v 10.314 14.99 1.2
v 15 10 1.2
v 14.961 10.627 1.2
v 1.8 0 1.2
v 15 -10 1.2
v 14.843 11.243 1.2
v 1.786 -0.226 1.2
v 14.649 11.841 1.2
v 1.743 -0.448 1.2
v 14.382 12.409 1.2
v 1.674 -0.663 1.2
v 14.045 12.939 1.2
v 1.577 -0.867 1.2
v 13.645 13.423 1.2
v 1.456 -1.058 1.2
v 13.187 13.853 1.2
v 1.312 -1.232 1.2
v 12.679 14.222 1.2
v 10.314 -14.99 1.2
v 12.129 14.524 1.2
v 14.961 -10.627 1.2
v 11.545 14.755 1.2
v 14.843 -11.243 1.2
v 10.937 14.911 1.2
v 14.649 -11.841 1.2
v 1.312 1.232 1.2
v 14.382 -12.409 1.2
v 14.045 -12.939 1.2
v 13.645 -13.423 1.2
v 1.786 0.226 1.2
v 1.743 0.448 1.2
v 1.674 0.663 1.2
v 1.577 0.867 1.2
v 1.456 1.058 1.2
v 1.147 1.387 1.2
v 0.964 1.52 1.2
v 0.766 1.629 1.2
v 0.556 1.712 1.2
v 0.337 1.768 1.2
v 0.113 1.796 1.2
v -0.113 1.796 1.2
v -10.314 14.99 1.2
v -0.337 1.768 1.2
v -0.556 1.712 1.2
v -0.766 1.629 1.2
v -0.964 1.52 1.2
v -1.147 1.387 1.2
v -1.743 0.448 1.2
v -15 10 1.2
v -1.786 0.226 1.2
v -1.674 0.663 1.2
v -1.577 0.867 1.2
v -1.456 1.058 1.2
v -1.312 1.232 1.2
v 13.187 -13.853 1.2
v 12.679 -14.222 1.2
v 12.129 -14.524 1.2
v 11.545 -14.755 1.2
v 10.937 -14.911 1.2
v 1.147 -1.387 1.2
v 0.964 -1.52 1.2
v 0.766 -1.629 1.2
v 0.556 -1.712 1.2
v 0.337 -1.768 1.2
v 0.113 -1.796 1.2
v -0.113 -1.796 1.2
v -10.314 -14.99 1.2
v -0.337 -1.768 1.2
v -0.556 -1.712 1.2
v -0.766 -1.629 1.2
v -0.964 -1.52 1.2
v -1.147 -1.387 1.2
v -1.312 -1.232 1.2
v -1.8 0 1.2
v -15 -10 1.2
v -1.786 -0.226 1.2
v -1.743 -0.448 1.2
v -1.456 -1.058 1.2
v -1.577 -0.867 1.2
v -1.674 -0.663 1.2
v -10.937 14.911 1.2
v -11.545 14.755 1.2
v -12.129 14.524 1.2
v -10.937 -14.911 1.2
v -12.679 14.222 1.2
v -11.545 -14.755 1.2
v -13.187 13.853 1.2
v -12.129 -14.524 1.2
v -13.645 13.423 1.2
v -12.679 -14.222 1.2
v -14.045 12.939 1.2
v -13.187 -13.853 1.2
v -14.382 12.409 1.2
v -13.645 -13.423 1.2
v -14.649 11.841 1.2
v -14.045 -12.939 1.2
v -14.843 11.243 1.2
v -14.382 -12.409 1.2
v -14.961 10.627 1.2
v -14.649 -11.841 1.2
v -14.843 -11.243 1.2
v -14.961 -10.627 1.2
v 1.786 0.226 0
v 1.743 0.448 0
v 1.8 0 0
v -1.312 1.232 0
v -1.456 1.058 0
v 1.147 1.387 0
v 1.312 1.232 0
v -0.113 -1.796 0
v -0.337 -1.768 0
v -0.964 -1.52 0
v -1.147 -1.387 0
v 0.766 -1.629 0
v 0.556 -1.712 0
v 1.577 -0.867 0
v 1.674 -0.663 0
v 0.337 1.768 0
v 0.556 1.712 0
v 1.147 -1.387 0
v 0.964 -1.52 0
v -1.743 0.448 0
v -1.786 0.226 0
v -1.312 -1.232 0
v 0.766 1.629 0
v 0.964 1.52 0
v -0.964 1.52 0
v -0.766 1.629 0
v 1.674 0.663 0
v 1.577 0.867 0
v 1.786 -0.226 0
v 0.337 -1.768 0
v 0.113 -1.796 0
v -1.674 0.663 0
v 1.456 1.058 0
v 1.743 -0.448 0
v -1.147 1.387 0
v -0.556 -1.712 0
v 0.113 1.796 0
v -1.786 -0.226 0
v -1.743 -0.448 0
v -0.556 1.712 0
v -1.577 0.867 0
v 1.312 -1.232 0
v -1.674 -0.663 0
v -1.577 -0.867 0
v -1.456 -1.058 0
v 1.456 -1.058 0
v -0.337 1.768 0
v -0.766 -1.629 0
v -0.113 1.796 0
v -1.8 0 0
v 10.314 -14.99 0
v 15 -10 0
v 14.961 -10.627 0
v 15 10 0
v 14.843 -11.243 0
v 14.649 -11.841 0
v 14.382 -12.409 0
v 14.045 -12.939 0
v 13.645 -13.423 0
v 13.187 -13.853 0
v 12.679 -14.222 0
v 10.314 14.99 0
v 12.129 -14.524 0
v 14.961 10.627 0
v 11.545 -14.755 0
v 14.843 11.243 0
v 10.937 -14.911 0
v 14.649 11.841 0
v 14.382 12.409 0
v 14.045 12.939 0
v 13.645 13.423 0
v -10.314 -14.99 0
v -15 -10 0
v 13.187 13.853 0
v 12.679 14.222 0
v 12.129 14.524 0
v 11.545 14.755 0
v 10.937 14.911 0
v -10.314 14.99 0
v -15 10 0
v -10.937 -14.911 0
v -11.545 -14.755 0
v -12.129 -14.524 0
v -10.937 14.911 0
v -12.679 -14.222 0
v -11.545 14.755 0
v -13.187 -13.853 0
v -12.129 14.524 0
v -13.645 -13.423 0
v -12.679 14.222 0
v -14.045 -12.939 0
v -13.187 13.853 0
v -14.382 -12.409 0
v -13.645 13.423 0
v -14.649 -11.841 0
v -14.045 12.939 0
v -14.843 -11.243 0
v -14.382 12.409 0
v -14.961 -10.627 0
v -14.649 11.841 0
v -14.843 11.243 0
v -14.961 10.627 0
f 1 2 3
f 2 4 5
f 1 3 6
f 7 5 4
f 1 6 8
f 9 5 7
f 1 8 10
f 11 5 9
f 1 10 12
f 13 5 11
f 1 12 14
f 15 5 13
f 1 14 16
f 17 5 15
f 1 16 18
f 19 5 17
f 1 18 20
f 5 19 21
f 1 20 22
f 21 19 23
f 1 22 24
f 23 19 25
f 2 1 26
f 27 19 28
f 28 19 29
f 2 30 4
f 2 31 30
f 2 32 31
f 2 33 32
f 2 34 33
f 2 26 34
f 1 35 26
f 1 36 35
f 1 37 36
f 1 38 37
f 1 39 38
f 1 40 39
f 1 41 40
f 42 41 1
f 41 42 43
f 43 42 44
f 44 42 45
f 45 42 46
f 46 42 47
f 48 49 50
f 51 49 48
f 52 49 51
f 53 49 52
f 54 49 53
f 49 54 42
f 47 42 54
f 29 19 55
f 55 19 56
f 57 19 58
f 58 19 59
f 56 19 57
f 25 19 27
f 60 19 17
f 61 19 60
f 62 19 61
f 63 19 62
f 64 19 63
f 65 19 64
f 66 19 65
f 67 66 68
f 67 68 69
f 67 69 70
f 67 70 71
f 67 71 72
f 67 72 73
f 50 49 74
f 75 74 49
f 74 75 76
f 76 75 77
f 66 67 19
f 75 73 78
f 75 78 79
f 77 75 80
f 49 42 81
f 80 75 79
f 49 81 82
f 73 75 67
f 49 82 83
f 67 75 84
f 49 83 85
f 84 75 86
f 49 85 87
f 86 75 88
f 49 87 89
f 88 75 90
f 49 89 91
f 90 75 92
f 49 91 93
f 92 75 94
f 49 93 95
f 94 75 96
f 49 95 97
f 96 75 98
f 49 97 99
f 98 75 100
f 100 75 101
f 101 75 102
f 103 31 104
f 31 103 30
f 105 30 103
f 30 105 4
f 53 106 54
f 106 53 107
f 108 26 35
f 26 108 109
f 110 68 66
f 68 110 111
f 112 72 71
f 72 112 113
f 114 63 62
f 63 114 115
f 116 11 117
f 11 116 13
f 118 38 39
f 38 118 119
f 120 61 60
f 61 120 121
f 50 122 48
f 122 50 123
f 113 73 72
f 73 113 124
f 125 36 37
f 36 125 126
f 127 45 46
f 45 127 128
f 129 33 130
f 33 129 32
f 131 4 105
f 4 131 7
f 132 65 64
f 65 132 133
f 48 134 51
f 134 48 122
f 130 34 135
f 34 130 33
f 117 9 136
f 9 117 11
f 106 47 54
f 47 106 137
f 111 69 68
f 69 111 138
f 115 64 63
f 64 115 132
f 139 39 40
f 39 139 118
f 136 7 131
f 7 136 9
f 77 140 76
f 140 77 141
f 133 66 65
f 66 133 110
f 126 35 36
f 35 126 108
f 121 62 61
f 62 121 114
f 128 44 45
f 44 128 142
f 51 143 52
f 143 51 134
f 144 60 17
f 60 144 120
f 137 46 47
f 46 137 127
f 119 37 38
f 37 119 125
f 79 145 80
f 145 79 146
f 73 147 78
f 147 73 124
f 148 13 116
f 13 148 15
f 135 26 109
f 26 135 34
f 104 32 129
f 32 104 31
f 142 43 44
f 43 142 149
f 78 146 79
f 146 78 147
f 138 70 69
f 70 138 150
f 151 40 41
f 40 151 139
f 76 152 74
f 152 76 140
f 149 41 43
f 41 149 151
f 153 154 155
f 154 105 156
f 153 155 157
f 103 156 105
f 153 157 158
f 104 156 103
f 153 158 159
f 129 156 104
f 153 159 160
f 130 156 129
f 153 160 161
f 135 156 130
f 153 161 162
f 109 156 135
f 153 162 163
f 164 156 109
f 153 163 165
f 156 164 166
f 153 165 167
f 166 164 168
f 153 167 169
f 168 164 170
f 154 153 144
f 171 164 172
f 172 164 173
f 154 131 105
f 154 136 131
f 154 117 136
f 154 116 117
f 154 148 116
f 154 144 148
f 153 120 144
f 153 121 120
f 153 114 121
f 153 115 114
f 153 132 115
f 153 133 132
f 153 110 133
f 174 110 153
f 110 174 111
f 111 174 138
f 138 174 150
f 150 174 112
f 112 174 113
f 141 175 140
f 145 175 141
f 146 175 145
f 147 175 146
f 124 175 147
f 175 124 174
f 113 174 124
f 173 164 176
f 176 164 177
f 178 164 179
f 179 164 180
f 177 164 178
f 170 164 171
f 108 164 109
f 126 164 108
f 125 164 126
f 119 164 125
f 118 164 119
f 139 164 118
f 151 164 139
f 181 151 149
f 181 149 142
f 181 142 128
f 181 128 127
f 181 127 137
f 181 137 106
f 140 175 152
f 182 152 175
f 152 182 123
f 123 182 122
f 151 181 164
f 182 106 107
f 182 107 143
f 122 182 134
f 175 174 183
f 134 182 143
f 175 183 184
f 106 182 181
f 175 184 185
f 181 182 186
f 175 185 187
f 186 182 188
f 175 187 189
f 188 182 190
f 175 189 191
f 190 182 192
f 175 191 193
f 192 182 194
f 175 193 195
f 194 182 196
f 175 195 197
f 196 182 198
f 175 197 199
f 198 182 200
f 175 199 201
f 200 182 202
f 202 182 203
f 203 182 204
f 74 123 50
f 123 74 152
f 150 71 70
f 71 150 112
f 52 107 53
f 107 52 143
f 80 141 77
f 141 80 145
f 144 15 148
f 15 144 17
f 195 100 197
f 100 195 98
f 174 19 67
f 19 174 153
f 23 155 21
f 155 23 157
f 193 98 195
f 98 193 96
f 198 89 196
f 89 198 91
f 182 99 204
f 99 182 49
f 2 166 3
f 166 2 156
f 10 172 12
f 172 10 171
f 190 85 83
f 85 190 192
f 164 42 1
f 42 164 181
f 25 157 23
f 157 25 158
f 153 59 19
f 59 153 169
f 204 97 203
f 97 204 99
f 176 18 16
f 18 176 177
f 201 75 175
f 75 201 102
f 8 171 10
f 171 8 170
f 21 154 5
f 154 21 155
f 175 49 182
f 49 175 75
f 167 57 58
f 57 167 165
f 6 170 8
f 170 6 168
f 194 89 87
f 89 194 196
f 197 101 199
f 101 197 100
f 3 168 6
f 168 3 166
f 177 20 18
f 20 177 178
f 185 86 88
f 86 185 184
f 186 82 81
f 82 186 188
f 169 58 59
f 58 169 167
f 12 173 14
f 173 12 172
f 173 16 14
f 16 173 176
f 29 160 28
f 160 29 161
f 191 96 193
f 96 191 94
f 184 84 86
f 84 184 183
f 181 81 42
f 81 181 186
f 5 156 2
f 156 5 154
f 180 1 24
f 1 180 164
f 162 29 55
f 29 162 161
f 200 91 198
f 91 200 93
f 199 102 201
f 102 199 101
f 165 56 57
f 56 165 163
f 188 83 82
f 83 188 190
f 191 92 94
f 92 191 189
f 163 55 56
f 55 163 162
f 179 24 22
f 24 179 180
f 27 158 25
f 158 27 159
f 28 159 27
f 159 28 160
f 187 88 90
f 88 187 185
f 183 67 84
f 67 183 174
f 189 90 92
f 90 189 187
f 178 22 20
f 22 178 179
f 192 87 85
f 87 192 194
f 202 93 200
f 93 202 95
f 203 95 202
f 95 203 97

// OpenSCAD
$fn = 50;


difference() {
	union() {
		hull() {
			translate(v = [-10.0000000000, 10.0000000000, 0]) {
				cylinder(h = 27, r = 5);
			}
			translate(v = [10.0000000000, 10.0000000000, 0]) {
				cylinder(h = 27, r = 5);
			}
			translate(v = [-10.0000000000, -10.0000000000, 0]) {
				cylinder(h = 27, r = 5);
			}
			translate(v = [10.0000000000, -10.0000000000, 0]) {
				cylinder(h = 27, r = 5);
			}
		}
	}
	union() {
		translate(v = [0, 0, 1.2000000000]) {
			hull() {
				translate(v = [-10.0000000000, 10.0000000000, 0]) {
					cylinder(h = 25.8000000000, r = 3.8000000000);
				}
				translate(v = [10.0000000000, 10.0000000000, 0]) {
					cylinder(h = 25.8000000000, r = 3.8000000000);
				}
				translate(v = [-10.0000000000, -10.0000000000, 0]) {
					cylinder(h = 25.8000000000, r = 3.8000000000);
				}
				translate(v = [10.0000000000, -10.0000000000, 0]) {
					cylinder(h = 25.8000000000, r = 3.8000000000);
				}
			}
		}
		#cylinder(h = 1.2000000000, r = 1.8000000000);
		translate(v = [-250.0000000000, -250.0000000000, 1.2000000000]) {
			cube(size = [500, 500, 500]);
		}
		translate(v = [-250.0000000000, -250.0000000000, 1.2000000000]) {
			cube(size = [500, 500, 500]);
		}
		translate(v = [-250.0000000000, -250.0000000000, 1.2000000000]) {
			cube(size = [500, 500, 500]);
		}
	}
}
